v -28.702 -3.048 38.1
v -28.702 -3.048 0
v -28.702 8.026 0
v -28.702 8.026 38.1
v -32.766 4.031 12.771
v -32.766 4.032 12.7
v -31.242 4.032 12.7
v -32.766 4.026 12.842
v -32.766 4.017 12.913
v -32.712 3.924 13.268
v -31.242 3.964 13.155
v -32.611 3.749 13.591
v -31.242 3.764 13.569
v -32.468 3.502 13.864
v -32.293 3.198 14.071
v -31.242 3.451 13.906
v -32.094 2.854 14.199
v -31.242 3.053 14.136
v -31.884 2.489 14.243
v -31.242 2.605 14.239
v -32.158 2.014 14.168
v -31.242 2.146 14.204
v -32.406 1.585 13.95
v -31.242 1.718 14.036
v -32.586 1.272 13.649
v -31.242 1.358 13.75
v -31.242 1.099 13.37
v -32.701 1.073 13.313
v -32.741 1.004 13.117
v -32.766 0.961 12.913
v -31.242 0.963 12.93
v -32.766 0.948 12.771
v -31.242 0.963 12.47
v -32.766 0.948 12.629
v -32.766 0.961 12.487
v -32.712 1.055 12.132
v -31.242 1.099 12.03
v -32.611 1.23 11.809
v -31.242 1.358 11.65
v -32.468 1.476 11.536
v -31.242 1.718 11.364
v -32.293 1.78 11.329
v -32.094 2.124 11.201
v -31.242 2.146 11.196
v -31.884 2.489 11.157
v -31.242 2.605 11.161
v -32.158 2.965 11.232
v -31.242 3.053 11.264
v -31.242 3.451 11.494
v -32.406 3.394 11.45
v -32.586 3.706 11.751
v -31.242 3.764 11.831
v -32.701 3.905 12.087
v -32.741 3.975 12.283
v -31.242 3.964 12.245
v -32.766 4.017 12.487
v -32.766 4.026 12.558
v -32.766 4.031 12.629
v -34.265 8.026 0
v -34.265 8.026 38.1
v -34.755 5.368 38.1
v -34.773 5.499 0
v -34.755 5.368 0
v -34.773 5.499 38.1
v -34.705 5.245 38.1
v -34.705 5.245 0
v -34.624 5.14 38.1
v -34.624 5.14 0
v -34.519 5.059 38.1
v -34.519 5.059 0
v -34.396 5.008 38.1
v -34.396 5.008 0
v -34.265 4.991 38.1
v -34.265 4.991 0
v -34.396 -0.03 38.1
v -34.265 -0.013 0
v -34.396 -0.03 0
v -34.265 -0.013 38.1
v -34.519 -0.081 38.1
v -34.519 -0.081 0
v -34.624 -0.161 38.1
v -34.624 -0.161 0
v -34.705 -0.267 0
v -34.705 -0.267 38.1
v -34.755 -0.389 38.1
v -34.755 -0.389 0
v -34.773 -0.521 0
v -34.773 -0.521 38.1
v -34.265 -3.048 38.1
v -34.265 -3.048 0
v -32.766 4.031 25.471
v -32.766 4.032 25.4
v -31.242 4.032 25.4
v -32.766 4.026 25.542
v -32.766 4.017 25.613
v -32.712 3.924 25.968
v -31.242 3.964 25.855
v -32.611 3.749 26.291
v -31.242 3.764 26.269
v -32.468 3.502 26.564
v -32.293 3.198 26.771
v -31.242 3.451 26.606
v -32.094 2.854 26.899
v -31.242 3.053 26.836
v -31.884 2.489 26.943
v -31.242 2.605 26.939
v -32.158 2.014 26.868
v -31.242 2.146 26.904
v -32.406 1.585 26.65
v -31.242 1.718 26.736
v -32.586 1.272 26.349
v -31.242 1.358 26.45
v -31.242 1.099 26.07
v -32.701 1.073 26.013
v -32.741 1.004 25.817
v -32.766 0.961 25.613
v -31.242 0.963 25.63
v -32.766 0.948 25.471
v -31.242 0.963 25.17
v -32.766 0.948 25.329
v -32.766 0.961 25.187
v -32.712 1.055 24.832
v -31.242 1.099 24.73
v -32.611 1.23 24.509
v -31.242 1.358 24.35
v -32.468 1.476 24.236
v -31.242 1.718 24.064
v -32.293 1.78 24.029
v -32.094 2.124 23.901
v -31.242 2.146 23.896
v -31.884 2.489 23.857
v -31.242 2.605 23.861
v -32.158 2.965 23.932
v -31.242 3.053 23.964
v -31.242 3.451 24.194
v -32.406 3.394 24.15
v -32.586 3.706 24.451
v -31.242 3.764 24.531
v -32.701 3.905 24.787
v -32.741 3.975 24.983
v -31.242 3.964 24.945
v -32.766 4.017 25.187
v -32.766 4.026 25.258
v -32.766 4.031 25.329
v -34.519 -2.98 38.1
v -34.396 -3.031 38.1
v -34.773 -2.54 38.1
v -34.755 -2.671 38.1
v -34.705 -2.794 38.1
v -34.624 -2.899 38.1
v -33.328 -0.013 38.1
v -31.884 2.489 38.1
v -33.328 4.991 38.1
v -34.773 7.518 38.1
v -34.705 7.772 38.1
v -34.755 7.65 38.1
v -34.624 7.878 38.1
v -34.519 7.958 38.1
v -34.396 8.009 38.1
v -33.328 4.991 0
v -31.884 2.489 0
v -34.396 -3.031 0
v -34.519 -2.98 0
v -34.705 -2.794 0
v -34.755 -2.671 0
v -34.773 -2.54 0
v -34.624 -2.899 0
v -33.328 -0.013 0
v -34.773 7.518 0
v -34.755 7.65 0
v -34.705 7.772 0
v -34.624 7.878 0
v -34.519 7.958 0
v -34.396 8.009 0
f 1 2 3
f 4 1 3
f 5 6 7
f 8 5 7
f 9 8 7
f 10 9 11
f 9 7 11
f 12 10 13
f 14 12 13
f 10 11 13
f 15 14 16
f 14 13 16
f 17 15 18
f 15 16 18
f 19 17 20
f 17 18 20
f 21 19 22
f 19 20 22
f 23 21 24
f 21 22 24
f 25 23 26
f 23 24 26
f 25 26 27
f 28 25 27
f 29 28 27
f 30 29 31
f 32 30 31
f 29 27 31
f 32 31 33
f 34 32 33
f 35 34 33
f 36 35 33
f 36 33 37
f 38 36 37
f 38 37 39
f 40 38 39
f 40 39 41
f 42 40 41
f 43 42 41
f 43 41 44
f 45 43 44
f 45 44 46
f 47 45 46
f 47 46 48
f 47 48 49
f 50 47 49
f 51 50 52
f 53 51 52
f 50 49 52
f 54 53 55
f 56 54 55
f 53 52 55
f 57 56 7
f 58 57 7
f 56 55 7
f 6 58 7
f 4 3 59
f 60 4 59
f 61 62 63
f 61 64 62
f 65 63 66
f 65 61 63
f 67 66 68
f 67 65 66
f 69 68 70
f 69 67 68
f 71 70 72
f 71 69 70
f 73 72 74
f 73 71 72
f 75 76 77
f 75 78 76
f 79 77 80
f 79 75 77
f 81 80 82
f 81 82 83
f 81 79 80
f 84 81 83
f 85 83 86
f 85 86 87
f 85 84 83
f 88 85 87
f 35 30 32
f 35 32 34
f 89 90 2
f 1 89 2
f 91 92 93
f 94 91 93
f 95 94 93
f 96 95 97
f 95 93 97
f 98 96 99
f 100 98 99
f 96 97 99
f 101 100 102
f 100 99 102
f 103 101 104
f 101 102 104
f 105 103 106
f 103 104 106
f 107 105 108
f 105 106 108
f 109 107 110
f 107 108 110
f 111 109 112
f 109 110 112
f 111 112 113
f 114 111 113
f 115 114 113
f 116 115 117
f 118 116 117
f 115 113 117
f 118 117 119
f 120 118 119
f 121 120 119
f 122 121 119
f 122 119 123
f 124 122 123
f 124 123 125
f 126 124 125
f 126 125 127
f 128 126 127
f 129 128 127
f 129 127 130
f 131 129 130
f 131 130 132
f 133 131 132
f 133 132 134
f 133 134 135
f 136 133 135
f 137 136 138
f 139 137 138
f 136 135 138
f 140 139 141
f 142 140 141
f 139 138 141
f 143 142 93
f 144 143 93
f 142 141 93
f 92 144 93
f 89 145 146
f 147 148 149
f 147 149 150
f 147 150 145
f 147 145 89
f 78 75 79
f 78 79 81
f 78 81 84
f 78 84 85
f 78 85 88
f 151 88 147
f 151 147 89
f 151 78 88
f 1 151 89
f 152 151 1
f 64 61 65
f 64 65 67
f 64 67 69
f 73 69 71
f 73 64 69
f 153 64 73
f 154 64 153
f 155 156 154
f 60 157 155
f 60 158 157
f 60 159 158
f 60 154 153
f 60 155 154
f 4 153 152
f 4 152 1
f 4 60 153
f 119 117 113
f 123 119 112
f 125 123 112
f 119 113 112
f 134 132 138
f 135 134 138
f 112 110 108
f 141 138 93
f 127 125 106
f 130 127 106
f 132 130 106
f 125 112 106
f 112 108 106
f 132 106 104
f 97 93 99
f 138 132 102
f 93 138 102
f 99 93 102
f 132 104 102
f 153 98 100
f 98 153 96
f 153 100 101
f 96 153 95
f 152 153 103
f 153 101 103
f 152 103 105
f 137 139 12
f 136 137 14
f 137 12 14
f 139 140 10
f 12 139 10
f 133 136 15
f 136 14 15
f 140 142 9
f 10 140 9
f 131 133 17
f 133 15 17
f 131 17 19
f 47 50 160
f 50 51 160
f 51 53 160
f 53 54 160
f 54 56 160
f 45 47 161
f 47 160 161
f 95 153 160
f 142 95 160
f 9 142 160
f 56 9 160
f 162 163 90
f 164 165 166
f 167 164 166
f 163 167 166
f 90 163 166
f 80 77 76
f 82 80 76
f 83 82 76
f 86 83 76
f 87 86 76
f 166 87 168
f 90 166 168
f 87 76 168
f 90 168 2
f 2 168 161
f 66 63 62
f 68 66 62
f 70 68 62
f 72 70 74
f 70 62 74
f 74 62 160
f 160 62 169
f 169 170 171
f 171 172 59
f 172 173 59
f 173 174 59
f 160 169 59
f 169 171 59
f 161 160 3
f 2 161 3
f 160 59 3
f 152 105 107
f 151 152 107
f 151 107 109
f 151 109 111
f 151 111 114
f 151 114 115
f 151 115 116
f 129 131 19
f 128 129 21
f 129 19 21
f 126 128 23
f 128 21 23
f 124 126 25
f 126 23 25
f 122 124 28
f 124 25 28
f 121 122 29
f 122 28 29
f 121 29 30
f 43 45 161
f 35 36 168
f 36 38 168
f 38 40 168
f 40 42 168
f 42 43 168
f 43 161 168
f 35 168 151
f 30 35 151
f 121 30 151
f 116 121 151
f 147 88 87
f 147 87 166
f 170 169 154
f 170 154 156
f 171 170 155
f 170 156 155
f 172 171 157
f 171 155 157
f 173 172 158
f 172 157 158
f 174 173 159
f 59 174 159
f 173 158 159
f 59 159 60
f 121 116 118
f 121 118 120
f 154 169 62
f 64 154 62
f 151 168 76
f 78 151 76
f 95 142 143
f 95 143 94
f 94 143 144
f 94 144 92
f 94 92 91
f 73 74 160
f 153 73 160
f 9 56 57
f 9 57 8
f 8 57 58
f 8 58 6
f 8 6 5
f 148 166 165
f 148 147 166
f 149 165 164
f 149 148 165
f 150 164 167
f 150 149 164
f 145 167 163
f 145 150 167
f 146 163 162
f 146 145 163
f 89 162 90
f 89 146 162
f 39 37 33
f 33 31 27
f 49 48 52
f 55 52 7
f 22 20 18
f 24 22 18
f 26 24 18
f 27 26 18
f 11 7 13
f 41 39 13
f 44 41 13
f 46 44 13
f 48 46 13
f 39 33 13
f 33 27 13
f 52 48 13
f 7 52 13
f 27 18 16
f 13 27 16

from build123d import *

# Parameters (mm, degrees)
F1_DEPTH = 38.1
F3_START = -2.54
F2_R     = 1.54305
F3_DEPTH = 1.524
F4_R     = 0.508


with BuildPart() as f1:
    # F0 (on Top) → F1 (new body)
    with BuildSketch(Plane.XY):
        Polygon((-31.75, 8.0264), (-34.7726, 8.0264), (-34.7726, 4.9911), (-33.3281273615, 4.9911), (-31.883654723, 2.4892), (-33.3281273615, -0.0127), (-34.7726, -0.0127), (-34.7726, -3.048), (-31.75, -3.048), (-28.702, -3.048), (-28.702, 8.0264), align=None)
    extrude(amount=F1_DEPTH)

    # F2 (on face) → F3 (cut)
    with BuildSketch(Plane.YZ.offset(-28.702).offset(F3_START)):
        with Locations((2.4892, 25.4)):
            Circle(F2_R)
        with Locations((2.4892, 12.7)):
            Circle(F2_R)
    extrude(amount=-F3_DEPTH, mode=Mode.SUBTRACT)

    # F4
    f4_edges = [f1.edges().sort_by_distance(p)[0] for p in [
        (-34.7726, -3.048, 19.05),
        (-34.7726, 8.0264, 19.05),
        (-34.7726, 4.9911, 19.05),
        (-34.7726, -0.0127, 19.05),
    ]]
    fillet(f4_edges, radius=F4_R)


solid = f1.part
